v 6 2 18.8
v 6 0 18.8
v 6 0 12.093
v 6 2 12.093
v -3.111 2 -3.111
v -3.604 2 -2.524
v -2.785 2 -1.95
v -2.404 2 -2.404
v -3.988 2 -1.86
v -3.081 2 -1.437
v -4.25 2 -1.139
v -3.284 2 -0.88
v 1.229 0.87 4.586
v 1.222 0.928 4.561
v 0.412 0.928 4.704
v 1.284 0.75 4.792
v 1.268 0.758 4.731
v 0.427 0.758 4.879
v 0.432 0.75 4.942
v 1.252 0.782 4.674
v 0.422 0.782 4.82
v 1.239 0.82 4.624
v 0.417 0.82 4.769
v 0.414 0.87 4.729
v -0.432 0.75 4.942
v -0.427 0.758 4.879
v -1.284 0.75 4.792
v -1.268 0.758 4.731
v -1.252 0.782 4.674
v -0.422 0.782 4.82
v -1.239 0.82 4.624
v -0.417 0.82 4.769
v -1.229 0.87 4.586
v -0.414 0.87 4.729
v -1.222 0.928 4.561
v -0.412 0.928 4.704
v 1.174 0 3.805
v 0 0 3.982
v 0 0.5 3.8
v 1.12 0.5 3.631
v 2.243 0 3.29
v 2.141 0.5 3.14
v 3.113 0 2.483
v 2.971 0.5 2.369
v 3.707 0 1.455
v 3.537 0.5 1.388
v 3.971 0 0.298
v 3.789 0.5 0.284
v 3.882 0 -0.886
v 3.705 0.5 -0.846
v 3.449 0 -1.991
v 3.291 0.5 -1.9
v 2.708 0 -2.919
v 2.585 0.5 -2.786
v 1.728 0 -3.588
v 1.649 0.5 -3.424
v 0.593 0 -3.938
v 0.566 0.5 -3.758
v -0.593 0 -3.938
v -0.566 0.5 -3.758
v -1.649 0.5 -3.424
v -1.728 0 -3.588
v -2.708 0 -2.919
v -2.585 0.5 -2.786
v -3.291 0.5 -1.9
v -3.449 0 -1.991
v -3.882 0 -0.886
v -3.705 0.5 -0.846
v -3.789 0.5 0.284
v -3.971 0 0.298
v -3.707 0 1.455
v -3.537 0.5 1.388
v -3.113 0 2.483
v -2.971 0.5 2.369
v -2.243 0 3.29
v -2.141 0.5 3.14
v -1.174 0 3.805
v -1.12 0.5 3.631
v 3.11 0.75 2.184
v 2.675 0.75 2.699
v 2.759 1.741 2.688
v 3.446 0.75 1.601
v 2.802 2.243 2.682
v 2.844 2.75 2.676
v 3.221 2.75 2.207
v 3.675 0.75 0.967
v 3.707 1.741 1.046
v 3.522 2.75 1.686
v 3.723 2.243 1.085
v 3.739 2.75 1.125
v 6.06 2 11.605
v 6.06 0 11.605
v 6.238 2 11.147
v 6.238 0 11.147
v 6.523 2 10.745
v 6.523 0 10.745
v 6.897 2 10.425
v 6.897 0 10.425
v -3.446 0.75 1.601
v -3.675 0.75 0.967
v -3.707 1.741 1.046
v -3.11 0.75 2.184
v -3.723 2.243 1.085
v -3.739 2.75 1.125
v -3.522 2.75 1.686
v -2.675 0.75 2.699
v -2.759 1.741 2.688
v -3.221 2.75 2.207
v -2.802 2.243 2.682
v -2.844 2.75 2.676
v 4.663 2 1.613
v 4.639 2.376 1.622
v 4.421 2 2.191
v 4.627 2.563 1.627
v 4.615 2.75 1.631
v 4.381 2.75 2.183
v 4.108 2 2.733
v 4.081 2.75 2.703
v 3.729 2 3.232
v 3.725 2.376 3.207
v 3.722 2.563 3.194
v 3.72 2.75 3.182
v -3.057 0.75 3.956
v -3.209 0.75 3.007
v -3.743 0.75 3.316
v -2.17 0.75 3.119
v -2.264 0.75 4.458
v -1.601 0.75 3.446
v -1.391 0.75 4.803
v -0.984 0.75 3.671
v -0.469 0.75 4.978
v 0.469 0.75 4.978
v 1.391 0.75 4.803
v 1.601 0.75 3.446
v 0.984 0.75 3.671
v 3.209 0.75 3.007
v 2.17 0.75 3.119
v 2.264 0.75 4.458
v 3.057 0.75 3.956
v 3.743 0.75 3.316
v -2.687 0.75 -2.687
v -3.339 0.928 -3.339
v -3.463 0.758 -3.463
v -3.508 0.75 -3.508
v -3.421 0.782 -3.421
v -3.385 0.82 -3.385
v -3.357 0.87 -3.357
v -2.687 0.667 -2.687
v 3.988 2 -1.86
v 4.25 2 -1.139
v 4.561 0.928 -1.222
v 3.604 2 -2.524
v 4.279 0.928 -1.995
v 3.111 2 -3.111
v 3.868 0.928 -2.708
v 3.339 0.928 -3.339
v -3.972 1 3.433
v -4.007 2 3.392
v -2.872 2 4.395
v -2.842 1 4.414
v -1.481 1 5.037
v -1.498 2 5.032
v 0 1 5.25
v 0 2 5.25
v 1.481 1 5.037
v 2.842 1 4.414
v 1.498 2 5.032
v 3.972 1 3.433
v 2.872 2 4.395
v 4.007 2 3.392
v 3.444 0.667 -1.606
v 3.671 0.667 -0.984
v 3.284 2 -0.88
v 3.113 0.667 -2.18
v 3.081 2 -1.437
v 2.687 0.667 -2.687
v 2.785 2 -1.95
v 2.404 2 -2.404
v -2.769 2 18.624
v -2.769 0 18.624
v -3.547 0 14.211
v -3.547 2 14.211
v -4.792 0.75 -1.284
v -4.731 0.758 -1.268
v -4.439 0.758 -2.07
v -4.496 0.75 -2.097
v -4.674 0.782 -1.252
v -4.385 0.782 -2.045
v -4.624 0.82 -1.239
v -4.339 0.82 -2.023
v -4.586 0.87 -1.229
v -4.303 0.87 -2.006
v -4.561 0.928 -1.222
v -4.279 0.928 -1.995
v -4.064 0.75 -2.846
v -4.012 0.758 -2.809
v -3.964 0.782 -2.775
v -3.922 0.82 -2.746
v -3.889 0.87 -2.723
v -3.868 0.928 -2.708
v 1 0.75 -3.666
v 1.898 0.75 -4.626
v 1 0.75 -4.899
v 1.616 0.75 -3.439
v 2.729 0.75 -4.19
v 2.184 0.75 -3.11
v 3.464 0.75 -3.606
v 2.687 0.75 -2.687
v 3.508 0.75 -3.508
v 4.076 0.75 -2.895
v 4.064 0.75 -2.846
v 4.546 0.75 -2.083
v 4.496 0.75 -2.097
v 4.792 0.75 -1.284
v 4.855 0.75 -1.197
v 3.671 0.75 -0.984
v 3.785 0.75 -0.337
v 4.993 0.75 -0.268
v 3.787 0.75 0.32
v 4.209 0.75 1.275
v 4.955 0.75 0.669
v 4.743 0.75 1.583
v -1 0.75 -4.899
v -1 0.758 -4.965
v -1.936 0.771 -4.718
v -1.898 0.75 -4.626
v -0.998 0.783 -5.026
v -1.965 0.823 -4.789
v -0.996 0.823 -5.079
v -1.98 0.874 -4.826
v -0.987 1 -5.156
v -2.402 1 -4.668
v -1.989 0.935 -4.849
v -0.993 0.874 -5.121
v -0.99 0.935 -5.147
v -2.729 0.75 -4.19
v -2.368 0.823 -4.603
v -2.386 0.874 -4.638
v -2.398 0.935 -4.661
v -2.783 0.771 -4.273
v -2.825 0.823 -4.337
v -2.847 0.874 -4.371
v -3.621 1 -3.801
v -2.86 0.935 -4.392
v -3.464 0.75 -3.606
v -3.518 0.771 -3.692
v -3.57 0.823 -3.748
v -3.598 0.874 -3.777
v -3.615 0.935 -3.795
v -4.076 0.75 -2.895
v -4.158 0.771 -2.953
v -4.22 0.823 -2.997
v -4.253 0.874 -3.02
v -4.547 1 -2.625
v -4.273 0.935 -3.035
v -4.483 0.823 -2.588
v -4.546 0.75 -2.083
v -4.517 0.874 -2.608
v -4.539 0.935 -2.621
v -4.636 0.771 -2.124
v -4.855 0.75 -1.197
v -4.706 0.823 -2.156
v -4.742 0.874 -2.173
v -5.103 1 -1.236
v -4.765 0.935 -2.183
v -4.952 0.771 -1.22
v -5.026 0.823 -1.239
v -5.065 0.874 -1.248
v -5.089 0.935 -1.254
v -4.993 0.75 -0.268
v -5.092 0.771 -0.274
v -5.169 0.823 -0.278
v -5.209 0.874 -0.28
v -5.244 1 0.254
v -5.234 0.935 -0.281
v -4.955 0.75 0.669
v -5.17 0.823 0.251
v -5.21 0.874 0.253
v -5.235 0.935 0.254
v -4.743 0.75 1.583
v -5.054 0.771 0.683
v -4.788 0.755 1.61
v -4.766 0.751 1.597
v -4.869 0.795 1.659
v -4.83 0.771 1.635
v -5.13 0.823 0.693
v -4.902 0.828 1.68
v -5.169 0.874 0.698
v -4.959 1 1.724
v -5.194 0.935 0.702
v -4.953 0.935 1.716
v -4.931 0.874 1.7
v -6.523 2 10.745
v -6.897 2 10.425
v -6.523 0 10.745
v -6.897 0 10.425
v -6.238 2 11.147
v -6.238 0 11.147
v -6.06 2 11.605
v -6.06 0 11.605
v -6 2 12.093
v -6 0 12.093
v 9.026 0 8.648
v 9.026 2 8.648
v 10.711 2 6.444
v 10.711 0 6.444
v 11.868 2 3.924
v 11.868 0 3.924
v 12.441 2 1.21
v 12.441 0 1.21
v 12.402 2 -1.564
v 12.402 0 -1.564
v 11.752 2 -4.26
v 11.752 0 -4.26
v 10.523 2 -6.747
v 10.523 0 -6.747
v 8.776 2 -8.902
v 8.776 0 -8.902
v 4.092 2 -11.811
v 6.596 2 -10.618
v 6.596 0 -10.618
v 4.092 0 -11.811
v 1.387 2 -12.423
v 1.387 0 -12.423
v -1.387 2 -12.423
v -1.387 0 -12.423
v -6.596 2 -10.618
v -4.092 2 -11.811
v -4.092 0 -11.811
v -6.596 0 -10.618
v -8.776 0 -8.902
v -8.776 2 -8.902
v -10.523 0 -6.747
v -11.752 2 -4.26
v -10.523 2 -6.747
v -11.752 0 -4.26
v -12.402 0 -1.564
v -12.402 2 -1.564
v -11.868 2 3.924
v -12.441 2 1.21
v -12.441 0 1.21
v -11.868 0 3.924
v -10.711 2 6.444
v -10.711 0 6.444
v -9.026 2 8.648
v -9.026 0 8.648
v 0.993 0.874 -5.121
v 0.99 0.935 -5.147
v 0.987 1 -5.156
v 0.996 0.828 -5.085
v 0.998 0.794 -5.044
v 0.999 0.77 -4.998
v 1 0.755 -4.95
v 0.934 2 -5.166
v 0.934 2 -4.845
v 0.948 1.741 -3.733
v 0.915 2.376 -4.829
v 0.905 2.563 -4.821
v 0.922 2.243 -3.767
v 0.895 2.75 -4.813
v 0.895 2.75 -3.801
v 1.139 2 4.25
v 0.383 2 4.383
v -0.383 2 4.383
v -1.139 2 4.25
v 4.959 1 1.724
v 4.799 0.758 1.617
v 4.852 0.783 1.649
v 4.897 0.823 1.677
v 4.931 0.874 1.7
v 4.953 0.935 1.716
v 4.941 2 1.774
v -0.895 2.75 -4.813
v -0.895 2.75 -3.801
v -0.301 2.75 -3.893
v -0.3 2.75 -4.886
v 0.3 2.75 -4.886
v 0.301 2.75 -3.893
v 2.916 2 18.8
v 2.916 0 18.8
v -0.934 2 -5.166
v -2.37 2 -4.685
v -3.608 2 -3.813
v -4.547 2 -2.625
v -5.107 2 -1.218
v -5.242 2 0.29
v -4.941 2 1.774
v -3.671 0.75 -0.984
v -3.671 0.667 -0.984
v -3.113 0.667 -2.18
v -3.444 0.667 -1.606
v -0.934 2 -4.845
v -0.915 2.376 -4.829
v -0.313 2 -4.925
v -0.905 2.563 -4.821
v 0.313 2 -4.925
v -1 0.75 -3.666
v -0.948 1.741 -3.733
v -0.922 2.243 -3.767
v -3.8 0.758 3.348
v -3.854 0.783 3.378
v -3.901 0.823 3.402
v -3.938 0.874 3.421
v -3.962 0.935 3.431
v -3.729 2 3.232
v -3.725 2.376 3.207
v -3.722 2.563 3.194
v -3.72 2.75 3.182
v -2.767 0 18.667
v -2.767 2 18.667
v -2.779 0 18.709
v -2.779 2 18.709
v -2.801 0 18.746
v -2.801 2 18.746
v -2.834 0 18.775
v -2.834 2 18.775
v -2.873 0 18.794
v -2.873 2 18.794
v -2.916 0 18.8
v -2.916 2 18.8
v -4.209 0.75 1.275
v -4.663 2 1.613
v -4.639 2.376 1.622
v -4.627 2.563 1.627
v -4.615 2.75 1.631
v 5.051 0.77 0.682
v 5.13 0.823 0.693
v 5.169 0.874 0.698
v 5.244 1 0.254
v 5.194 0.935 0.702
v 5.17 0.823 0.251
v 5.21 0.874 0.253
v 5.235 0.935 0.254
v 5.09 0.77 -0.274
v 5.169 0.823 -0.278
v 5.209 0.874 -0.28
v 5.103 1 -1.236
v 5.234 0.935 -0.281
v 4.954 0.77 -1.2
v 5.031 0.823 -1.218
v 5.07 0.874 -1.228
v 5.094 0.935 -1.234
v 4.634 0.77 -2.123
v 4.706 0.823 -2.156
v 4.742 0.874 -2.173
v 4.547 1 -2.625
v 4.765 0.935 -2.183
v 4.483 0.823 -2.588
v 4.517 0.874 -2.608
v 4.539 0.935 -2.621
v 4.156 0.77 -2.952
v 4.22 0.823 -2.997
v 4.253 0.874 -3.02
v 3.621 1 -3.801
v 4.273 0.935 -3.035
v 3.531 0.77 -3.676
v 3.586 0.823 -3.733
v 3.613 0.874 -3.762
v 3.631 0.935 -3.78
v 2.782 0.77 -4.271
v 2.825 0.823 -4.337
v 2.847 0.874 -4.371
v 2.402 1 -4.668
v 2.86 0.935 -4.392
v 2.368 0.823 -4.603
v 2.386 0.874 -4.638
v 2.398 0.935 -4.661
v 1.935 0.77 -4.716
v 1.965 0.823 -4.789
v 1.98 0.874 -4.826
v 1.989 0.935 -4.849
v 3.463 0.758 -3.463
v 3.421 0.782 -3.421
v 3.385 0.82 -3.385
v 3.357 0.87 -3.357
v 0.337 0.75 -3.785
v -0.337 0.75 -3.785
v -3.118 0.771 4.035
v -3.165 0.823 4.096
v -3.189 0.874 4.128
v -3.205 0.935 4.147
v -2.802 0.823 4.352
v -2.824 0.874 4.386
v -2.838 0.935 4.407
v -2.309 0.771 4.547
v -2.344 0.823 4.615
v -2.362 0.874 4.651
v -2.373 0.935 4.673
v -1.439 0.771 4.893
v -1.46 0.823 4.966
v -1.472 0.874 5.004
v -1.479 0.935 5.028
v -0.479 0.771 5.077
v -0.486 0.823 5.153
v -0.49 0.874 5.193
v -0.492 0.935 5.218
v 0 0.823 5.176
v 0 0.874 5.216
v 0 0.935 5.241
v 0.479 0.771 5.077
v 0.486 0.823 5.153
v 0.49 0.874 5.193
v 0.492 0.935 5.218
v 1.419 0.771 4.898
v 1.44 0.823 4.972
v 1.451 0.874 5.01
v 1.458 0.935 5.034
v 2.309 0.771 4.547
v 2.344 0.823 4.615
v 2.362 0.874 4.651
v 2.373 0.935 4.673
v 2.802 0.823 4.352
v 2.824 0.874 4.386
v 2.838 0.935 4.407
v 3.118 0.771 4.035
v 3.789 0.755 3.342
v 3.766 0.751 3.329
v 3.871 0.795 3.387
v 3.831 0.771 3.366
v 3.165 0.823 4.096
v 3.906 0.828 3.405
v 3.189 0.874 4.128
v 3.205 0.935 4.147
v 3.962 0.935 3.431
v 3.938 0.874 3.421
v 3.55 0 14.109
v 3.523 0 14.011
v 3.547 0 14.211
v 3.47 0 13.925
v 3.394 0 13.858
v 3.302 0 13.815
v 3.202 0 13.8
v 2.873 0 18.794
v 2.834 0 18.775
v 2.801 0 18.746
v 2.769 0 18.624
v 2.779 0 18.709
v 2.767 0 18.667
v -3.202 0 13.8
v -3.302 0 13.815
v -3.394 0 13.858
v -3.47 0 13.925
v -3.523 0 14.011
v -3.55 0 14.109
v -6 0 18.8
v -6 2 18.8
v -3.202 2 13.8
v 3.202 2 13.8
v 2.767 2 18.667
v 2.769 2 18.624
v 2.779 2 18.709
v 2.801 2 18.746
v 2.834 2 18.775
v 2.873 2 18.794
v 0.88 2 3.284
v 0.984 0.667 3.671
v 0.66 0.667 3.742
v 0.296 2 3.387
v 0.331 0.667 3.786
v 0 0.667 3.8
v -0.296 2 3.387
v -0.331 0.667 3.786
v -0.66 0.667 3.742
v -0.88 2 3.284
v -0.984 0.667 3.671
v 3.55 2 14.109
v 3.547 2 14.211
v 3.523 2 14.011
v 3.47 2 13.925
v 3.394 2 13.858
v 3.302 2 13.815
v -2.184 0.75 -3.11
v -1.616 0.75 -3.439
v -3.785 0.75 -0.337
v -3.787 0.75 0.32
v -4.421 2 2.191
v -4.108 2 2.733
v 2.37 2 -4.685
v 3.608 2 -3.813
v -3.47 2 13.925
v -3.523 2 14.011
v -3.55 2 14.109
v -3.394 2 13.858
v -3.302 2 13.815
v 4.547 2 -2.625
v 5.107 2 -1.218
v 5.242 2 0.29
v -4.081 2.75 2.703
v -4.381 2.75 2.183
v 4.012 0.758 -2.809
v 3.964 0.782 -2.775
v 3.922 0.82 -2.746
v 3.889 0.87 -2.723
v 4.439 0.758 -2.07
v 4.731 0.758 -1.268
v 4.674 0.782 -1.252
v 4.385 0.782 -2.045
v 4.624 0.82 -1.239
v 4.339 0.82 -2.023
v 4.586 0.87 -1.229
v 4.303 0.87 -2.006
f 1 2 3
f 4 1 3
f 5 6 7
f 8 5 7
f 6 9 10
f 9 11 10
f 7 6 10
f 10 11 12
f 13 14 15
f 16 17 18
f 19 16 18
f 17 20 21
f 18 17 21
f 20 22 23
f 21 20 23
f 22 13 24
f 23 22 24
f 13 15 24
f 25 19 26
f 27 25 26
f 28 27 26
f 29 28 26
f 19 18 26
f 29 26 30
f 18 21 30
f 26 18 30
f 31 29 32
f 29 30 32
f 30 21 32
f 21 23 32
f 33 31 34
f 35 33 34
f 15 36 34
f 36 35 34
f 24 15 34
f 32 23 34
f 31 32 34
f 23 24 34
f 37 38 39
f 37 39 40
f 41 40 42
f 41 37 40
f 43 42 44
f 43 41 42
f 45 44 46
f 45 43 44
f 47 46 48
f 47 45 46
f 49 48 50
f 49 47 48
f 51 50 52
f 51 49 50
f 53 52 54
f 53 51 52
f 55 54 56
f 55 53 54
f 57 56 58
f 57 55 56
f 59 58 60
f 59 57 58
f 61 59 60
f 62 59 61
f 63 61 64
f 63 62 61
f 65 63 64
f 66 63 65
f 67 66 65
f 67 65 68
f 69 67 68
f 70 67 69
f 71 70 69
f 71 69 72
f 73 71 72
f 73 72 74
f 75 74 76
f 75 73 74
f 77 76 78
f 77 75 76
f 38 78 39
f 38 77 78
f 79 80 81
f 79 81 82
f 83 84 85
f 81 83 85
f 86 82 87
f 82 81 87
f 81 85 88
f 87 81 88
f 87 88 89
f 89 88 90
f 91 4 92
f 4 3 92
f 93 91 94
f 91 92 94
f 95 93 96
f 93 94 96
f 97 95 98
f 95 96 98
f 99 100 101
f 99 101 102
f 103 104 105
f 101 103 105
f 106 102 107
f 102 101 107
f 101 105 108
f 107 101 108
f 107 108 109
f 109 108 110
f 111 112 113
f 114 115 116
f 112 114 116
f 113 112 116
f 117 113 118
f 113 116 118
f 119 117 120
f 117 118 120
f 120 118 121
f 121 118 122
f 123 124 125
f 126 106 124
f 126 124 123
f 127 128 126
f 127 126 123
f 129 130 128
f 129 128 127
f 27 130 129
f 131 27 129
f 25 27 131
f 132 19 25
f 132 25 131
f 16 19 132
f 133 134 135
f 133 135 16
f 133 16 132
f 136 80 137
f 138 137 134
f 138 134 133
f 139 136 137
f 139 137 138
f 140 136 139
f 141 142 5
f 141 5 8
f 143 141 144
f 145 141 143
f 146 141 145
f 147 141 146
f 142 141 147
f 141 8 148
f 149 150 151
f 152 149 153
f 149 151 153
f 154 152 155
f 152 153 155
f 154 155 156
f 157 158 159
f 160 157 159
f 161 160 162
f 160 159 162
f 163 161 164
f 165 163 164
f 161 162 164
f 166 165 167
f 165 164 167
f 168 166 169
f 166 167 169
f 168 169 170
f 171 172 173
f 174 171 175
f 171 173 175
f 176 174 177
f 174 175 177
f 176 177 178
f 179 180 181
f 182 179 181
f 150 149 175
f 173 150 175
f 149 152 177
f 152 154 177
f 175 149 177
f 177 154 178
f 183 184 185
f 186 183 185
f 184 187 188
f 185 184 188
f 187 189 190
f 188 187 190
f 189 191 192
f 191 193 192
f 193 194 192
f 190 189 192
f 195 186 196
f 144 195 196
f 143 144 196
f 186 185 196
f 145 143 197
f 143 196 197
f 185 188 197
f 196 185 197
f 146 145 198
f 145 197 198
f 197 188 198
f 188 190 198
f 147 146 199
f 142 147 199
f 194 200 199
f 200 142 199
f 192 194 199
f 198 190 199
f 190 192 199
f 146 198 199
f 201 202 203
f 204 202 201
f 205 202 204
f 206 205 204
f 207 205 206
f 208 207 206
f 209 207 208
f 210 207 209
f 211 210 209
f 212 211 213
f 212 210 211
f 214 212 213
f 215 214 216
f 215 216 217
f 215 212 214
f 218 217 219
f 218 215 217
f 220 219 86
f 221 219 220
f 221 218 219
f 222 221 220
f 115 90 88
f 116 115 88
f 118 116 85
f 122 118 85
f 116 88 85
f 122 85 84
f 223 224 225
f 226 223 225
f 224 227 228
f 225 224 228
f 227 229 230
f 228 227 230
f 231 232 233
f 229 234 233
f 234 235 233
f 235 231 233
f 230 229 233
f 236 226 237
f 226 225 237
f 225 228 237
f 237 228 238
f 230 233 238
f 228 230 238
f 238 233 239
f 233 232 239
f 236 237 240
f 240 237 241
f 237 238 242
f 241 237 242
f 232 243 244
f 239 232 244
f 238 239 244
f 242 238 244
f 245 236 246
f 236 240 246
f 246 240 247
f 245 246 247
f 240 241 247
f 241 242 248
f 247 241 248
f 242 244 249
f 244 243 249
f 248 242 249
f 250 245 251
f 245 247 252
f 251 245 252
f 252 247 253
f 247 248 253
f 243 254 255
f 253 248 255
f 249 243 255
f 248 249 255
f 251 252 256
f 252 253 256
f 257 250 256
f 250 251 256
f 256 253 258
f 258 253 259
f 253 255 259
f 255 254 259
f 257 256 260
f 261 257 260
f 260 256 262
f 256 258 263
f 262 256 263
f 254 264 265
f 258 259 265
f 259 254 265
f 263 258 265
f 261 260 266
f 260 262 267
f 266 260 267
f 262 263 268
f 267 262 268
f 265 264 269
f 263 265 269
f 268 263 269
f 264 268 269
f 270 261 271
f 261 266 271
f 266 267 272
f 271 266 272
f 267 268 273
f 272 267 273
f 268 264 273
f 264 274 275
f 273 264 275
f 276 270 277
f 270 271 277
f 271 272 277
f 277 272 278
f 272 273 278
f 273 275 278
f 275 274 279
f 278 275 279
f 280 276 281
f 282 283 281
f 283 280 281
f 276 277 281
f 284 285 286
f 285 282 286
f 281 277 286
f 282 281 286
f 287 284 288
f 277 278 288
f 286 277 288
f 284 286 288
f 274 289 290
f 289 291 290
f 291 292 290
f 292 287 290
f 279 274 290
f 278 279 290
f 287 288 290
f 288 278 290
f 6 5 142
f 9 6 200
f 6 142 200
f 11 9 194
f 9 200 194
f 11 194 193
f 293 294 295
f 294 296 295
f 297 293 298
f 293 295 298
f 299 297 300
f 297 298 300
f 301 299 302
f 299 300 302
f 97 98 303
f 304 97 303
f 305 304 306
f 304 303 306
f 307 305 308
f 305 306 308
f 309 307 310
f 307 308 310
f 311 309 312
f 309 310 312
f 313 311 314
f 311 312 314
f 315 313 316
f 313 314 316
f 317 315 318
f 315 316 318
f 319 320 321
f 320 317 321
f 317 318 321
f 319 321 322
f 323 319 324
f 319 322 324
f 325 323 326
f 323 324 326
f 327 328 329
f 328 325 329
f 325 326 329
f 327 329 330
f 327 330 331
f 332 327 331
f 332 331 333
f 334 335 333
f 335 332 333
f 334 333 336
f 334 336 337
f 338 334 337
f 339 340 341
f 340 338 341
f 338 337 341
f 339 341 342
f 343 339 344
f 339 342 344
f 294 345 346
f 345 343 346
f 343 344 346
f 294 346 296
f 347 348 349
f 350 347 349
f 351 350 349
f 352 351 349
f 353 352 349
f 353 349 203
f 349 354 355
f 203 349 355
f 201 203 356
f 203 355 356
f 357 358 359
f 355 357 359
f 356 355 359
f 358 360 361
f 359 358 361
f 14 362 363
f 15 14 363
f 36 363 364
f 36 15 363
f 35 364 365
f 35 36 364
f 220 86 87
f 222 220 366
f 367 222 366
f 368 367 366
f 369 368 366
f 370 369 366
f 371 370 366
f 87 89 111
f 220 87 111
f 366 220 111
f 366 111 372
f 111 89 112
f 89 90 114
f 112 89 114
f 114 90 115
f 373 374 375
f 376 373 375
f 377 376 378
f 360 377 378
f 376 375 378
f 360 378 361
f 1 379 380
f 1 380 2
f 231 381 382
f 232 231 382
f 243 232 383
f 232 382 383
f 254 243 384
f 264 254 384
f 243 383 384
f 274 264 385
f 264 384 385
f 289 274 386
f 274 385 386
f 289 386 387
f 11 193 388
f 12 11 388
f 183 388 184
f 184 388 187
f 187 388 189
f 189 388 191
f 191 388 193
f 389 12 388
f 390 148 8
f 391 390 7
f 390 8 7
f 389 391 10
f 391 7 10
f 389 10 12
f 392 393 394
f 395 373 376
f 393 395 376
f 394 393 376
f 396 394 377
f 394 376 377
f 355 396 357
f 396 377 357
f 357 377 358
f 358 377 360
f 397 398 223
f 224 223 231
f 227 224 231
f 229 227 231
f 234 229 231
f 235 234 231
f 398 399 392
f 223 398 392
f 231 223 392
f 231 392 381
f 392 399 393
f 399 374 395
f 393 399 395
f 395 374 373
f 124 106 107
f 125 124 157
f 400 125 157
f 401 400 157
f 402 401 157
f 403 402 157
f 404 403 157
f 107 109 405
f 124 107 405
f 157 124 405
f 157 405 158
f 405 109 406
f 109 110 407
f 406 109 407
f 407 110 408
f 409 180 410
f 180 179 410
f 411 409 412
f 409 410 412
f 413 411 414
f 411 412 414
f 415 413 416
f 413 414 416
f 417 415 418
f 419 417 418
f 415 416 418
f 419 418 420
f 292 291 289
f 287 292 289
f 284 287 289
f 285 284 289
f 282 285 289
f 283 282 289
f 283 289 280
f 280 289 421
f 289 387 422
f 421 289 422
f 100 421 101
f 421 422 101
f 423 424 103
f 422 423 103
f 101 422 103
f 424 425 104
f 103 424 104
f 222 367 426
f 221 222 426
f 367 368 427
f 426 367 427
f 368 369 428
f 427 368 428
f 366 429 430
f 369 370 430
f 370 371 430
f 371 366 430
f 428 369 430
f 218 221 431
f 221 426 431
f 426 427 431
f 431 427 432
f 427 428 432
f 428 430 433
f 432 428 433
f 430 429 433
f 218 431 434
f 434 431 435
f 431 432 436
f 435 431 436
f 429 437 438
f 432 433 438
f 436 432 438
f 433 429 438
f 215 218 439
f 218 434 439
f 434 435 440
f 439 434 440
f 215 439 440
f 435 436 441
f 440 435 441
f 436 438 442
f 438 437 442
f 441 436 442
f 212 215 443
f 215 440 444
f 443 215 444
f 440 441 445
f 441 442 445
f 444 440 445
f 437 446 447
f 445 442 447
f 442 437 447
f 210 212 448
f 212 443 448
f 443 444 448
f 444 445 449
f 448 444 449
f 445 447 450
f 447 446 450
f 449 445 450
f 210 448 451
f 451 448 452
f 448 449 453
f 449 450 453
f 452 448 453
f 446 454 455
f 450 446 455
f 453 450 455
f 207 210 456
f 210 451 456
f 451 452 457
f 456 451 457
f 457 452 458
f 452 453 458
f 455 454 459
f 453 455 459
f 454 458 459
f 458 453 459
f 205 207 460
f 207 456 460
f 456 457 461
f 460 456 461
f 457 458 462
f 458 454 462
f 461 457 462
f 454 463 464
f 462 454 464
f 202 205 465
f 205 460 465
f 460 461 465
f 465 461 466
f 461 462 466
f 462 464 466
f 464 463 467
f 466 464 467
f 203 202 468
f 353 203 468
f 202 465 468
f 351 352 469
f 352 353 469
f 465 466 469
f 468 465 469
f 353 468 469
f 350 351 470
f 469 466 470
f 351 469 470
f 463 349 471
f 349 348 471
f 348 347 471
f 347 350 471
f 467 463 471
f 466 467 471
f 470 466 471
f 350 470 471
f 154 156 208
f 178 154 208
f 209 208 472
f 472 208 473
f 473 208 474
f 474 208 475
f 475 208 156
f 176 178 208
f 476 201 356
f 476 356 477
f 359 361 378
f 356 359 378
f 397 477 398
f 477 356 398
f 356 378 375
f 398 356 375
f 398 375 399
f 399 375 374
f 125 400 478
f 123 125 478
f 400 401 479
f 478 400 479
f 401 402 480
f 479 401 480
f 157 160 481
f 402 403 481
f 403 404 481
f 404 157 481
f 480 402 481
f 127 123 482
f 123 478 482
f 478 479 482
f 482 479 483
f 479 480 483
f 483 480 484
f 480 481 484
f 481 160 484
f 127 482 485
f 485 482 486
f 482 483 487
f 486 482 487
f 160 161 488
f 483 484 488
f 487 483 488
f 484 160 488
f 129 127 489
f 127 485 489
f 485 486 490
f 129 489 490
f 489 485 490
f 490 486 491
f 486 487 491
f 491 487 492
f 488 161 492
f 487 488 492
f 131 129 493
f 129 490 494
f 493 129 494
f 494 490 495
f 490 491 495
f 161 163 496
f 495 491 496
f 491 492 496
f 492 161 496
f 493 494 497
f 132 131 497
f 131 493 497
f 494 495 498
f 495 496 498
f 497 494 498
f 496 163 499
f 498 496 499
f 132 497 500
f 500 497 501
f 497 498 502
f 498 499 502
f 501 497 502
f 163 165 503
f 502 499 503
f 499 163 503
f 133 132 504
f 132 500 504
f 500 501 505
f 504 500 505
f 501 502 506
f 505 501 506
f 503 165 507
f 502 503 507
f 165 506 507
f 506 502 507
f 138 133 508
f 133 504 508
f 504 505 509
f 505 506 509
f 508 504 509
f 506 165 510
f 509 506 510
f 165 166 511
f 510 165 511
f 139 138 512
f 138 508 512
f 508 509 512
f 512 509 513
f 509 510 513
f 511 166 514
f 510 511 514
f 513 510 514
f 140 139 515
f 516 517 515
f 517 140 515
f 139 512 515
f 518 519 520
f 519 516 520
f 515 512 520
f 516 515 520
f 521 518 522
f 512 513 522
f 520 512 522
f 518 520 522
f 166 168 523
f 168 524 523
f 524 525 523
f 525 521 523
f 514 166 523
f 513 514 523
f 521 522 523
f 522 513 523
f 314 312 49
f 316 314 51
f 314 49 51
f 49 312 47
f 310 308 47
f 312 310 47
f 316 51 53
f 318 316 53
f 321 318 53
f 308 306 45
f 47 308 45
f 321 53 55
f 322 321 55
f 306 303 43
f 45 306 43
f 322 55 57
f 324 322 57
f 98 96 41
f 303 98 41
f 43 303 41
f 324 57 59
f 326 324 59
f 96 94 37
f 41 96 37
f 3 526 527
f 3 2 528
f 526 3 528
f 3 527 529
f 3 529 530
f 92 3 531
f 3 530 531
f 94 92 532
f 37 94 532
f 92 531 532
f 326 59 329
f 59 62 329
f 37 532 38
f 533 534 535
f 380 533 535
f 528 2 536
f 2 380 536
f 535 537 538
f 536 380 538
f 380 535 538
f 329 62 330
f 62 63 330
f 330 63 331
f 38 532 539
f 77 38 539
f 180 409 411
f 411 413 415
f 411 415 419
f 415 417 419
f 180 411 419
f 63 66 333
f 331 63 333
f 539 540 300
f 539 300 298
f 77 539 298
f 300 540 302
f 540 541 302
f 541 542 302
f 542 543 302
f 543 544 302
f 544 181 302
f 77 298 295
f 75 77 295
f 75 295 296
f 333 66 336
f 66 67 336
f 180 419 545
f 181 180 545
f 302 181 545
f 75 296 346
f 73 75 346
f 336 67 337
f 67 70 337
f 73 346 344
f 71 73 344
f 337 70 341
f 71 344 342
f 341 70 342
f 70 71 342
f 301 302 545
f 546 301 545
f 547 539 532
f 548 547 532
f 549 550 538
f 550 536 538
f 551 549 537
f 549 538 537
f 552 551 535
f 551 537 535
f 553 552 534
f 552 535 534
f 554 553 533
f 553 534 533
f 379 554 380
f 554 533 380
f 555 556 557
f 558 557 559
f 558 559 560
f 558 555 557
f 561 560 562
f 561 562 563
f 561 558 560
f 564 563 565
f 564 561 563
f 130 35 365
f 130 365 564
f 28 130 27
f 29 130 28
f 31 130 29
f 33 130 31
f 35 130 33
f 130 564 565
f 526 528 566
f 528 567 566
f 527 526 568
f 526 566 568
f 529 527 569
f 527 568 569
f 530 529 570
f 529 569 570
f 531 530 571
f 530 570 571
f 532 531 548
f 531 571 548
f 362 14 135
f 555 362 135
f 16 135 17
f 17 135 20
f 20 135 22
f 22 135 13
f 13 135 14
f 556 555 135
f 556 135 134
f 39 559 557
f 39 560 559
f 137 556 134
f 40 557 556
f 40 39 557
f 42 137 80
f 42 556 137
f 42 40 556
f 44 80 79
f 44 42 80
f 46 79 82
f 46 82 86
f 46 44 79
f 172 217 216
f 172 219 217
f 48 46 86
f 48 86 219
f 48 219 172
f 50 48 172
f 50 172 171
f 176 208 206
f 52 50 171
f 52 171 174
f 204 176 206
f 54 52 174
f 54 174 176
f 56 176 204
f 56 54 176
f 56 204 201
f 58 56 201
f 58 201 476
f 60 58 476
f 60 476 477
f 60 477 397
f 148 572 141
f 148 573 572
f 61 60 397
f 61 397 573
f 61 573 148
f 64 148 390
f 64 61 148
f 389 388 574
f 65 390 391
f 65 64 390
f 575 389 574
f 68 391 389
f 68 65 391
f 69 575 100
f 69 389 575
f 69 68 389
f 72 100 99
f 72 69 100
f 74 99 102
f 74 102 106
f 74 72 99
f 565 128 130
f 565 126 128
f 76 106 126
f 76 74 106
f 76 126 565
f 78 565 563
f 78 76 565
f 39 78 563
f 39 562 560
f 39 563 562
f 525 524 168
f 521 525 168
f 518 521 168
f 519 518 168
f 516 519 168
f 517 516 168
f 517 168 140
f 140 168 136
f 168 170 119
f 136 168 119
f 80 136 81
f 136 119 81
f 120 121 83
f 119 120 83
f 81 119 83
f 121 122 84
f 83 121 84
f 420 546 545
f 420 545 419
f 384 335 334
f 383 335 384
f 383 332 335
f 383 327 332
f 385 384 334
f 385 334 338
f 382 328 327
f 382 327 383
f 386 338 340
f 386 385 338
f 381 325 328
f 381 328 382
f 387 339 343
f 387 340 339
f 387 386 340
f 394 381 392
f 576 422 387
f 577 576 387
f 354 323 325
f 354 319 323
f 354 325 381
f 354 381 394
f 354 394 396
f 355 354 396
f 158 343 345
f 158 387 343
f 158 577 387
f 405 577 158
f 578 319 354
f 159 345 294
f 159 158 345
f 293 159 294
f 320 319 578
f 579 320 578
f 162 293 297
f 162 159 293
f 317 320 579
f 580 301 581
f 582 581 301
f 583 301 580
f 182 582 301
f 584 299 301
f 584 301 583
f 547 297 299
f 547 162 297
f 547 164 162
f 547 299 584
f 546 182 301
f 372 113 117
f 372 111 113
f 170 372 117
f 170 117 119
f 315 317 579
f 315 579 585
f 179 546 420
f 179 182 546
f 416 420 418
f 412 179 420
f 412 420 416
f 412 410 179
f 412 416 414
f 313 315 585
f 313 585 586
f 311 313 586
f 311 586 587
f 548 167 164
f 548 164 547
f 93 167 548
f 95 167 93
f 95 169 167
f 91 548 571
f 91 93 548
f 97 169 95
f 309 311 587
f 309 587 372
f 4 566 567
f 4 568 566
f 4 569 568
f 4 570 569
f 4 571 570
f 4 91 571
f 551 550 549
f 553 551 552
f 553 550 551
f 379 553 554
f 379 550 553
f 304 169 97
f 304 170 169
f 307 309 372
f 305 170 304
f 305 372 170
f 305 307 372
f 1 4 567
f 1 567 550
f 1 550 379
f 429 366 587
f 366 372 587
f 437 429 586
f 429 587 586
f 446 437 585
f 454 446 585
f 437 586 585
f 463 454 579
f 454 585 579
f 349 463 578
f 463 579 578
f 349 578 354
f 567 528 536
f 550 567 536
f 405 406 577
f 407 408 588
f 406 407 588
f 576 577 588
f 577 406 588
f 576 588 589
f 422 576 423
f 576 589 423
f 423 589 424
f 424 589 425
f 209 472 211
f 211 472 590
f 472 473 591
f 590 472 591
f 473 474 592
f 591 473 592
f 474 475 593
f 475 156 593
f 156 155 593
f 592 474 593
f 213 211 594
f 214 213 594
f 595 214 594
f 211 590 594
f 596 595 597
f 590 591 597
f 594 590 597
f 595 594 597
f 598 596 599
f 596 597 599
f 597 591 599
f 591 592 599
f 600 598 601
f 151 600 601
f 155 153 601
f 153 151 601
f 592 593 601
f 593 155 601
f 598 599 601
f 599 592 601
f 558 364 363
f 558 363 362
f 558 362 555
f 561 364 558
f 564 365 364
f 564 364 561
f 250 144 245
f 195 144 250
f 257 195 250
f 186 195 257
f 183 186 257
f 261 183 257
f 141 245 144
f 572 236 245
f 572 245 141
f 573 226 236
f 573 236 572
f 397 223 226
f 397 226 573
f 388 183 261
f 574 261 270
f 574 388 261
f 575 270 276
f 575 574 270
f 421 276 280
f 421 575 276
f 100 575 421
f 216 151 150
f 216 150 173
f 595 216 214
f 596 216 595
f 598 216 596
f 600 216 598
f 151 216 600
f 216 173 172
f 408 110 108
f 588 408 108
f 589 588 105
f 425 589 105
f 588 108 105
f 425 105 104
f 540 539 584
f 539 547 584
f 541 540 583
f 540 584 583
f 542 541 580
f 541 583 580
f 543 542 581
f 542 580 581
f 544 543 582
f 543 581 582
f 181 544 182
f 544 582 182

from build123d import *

# Parameters (mm, degrees)
SKETCH1_R                = 4
BOSS_EXTRUDE1_DEPTH      = 2
SKETCH2_R                = 12.5
SKETCH2_R_2              = 3.8
BOSS_EXTRUDE2_DEPTH      = 2
SKETCH4_W                = 12
SKETCH4_H                = 0.2
CUT_EXTRUDE1_DEPTH       = 4
FILLET3_R                = 0.35
FILLET4_R                = 0.15
FILLET6_R                = 2
SKETCH13_R               = 5.25
CUT_EXTRUDE5_DEPTH       = 1.25
REVOLVE2_ANGLE           = 30
CIRPATTERN2_COUNT        = 3
CHAMFER1_SIZE            = 0.5
CHAMFER1_SIZE2           = 0.181985117
FILLET14_R               = 0.25
BOSS_EXTRUDE8_DEPTH      = 2
BOSS_EXTRUDE8_DRAFT      = -3
SKETCH16_W               = 2
SKETCH16_H               = 1.934959958
BOSS_EXTRUDE9_DEPTH      = 1.25
BOSS_EXTRUDE9_TAPER      = 3
CIRPATTERN3_COUNT        = 3
CIRPATTERN3_COPY_1_DEPTH = 2
CIRPATTERN3_COPY_1_DRAFT = -3
CIRPATTERN3_COPY_2_DEPTH = 2
CIRPATTERN3_COPY_2_DRAFT = -3


with BuildPart() as part:
    # Sketch1 → Boss-Extrude1 (new body)
    with BuildSketch(Plane(origin=(0, 0, 0), x_dir=(1, 0, 0), z_dir=(0, 1, 0))):
        Polygon((-6, 6), (-6, -13.291502622), (-6, -19), (-2.70227506, -19), (-3.619175359, -13.8), (0, -13.8), (3.619175359, -13.8), (2.70227506, -19), (6, -19), (6, -13.291502622), (6, 6), align=None)
        with Locations(Location((0, 0, 0), (0, 0, 270))):
            Circle(SKETCH1_R, mode=Mode.SUBTRACT)
    extrude(amount=BOSS_EXTRUDE1_DEPTH)

    # Sketch2 → Boss-Extrude2 (add)
    with BuildSketch(Plane(origin=(0, 0, 0), x_dir=(1, 0, 0), z_dir=(0, 1, 0))):
        Circle(SKETCH2_R)
        with Locations(Location((0, 0, 0), (0, 0, 270))):
            Circle(SKETCH2_R_2, mode=Mode.SUBTRACT)
    extrude(amount=BOSS_EXTRUDE2_DEPTH)

    # Sketch4 → Cut-Extrude1 (cut)
    with BuildSketch(Plane(origin=(0, 2, 0), x_dir=(1, 0, 0), z_dir=(0, 1, 0))):
        with Locations((0, -18.9)):
            Rectangle(SKETCH4_W, SKETCH4_H)
    extrude(amount=-CUT_EXTRUDE1_DEPTH, mode=Mode.SUBTRACT)

    # Fillet3
    fillet3_edges = [part.edges().sort_by_distance(p)[0] for p in [
        (3.619175359, 1, 13.8),
        (-3.619175359, 1, 13.8),
    ]]
    fillet(fillet3_edges, radius=FILLET3_R)

    # Fillet4
    fillet4_edges = [part.edges().sort_by_distance(p)[0] for p in [
        (2.737540456, 1, 18.8),
        (-2.737540456, 1, 18.8),
    ]]
    fillet(fillet4_edges, radius=FILLET4_R)

    # Fillet6
    fillet6_edges = [part.edges().sort_by_distance(p)[0] for p in [
        (6, 1, 10.9658561),
        (-6, 1, 10.9658561),
    ]]
    fillet(fillet6_edges, radius=FILLET6_R)

    # Sketch13 → Cut-Extrude5 (cut)
    with BuildSketch(Plane(origin=(0, 2, 0), x_dir=(1, 0, 0), z_dir=(0, 1, 0))):
        with Locations(Location((0, 0, 0), (0, 0, 270))):
            Circle(SKETCH13_R)
    extrude(amount=-CUT_EXTRUDE5_DEPTH, mode=Mode.SUBTRACT)

    # Sketch12 → Revolve2 (revolve, symmetric)
    with BuildSketch(Plane(origin=(0, 0, 0), x_dir=(0, 0, -1), z_dir=(1, 0, 0))) as revolve2_sk:
        Polygon((-4, 0), (-3.4, 2), (-4.4, 2), (-5, 0), align=None)
    revolve2 = revolve(axis=Axis((0, 0, 0), (0, 1, 0)), revolution_arc=REVOLVE2_ANGLE / 2)
    revolve2 = revolve2 + revolve(revolve2_sk.sketch, axis=Axis((0, 0, 0), (0, -1, 0)), revolution_arc=REVOLVE2_ANGLE / 2)

    # CirPattern2: Revolve2 ×3 about axis
    cirpattern2_axis = Axis((0, 0, 0), (0, 1, 0))
    for i in range(1, CIRPATTERN2_COUNT):
        add(revolve2.rotate(cirpattern2_axis, i * 360 / CIRPATTERN2_COUNT))

    # Chamfer1
    chamfer1_edges = [part.edges().sort_by_distance(p)[0] for p in [
        (0, 0, -3.8),
    ]]
    chamfer1_side = [part.faces().sort_by_distance(p)[0] for p in [
        (0, 0.375, -3.8),
    ]]
    chamfer(chamfer1_edges, length=CHAMFER1_SIZE, length2=CHAMFER1_SIZE2, reference=chamfer1_side[0])

    # Fillet14
    fillet14_edges = [part.edges().sort_by_distance(p)[0] for p in [
        (0, 0.75, -5.25),
        (0, 0.75, 4.775),
        (-4.135271303, 0.75, -2.3875),
        (4.135271303, 0.75, -2.3875),
    ]]
    fillet(fillet14_edges, radius=FILLET14_R)


with BuildPart() as boss_extrude8_tool:
    # Boss-Extrude8: read off the stored shape, not the designer's step
    # Boss-Extrude8 outline → Boss-Extrude8 (with draft: the straight prism first)
    with BuildSketch(Plane.XZ.offset(-2.75)):
        with BuildLine():
            Line((-0.895184441, -3.800819565), (-0.895184441, -4.812637066))
            ThreePointArc((-0.895184441, -4.812637066), (0, -4.895184441), (0.895184441, -4.812637066))
            Line((0.895184441, -4.812637066), (0.895184441, -3.800819565))
            ThreePointArc((0.895184441, -3.800819565), (0, -3.904815559), (-0.895184441, -3.800819565))
        make_face()
    extrude(amount=BOSS_EXTRUDE8_DEPTH)
    # Boss-Extrude8: the draft: its side faces are tilted about the plane it starts from
    boss_extrude8_sides = [boss_extrude8_tool.faces().sort_by_distance(p)[0] for p in [
        (0.895184441, 1.75, -4.306728316),
        (0, 1.75, -3.904815559),
        (-0.895184441, 1.75, -4.306728316),
        (0, 1.75, -4.895184441),
    ]]
    draft(boss_extrude8_sides, Plane.XZ.offset(-2.75), BOSS_EXTRUDE8_DRAFT)


with BuildPart() as part_1:
    add(part.part)

    # Boss-Extrude8: add boss_extrude8_tool
    add(boss_extrude8_tool.part)

    # Sketch16 → Boss-Extrude9 (add)
    with BuildSketch(Plane(origin=(0, 0.75, 0), x_dir=(1, 0, 0), z_dir=(0, 1, 0))):
        with Locations((0, 5.25)):
            Rectangle(SKETCH16_W, SKETCH16_H)
    boss_extrude9 = extrude(amount=BOSS_EXTRUDE9_DEPTH, taper=BOSS_EXTRUDE9_TAPER)

    # CirPattern3: Boss-Extrude9 ×3 about axis
    cirpattern3_axis = Axis((0, 0, 0), (0, 1, 0))
    for i in range(1, CIRPATTERN3_COUNT):
        add(boss_extrude9.rotate(cirpattern3_axis, i * 360 / CIRPATTERN3_COUNT))


with BuildPart() as cirpattern3_copy_1_tool:
    # CirPattern3 copy 1 sketch → CirPattern3 copy 1 (with draft: the straight prism first)
    with BuildSketch(Plane(origin=(0, 2.75, 0), x_dir=(-0.4999999999999998, 0, -0.8660254037844387), z_dir=(0, -1, 0))):
        with BuildLine():
            Line((-0.895184441, -3.800819565), (-0.895184441, -4.812637066))
            ThreePointArc((-0.895184441, -4.812637066), (0, -4.895184441), (0.895184441, -4.812637066))
            Line((0.895184441, -4.812637066), (0.895184441, -3.800819565))
            ThreePointArc((0.895184441, -3.800819565), (0, -3.904815559), (-0.895184441, -3.800819565))
        make_face()
    extrude(amount=CIRPATTERN3_COPY_1_DEPTH)
    # CirPattern3 copy 1: the draft: its side faces are tilted about the plane it starts from
    cirpattern3_copy_1_sides = [cirpattern3_copy_1_tool.faces().sort_by_distance(p)[0] for p in [
        (-4.177328349, 1.75, 1.378111691),
        (-3.381669471, 1.75, 1.952407779),
        (-3.282143908, 1.75, 2.928616625),
        (-4.239354082, 1.75, 2.44759222),
    ]]
    draft(cirpattern3_copy_1_sides, Plane(origin=(0, 2.75, 0), x_dir=(-0.4999999999999998, 0, -0.8660254037844387), z_dir=(0, -1, 0)), CIRPATTERN3_COPY_1_DRAFT)


with BuildPart() as part_2:
    add(part_1.part)

    # CirPattern3 copy 1: add cirpattern3_copy_1_tool
    add(cirpattern3_copy_1_tool.part)


with BuildPart() as cirpattern3_copy_2_tool:
    # CirPattern3 copy 2 sketch → CirPattern3 copy 2 (with draft: the straight prism first)
    with BuildSketch(Plane(origin=(0, 2.75, 0), x_dir=(-0.5000000000000004, 0, 0.8660254037844384), z_dir=(0, -1, 0))):
        with BuildLine():
            Line((-0.895184441, -3.800819565), (-0.895184441, -4.812637066))
            ThreePointArc((-0.895184441, -4.812637066), (0, -4.895184441), (0.895184441, -4.812637066))
            Line((0.895184441, -4.812637066), (0.895184441, -3.800819565))
            ThreePointArc((0.895184441, -3.800819565), (0, -3.904815559), (-0.895184441, -3.800819565))
        make_face()
    extrude(amount=CIRPATTERN3_COPY_2_DEPTH)
    # CirPattern3 copy 2: the draft: its side faces are tilted about the plane it starts from
    cirpattern3_copy_2_sides = [cirpattern3_copy_2_tool.faces().sort_by_distance(p)[0] for p in [
        (3.282143908, 1.75, 2.928616625),
        (3.381669471, 1.75, 1.95240778),
        (4.177328349, 1.75, 1.378111691),
        (4.239354082, 1.75, 2.447592221),
    ]]
    draft(cirpattern3_copy_2_sides, Plane(origin=(0, 2.75, 0), x_dir=(-0.5000000000000004, 0, 0.8660254037844384), z_dir=(0, -1, 0)), CIRPATTERN3_COPY_2_DRAFT)


with BuildPart() as part_3:
    add(part_2.part)

    # CirPattern3 copy 2: add cirpattern3_copy_2_tool
    add(cirpattern3_copy_2_tool.part)


solid = part_3.part
